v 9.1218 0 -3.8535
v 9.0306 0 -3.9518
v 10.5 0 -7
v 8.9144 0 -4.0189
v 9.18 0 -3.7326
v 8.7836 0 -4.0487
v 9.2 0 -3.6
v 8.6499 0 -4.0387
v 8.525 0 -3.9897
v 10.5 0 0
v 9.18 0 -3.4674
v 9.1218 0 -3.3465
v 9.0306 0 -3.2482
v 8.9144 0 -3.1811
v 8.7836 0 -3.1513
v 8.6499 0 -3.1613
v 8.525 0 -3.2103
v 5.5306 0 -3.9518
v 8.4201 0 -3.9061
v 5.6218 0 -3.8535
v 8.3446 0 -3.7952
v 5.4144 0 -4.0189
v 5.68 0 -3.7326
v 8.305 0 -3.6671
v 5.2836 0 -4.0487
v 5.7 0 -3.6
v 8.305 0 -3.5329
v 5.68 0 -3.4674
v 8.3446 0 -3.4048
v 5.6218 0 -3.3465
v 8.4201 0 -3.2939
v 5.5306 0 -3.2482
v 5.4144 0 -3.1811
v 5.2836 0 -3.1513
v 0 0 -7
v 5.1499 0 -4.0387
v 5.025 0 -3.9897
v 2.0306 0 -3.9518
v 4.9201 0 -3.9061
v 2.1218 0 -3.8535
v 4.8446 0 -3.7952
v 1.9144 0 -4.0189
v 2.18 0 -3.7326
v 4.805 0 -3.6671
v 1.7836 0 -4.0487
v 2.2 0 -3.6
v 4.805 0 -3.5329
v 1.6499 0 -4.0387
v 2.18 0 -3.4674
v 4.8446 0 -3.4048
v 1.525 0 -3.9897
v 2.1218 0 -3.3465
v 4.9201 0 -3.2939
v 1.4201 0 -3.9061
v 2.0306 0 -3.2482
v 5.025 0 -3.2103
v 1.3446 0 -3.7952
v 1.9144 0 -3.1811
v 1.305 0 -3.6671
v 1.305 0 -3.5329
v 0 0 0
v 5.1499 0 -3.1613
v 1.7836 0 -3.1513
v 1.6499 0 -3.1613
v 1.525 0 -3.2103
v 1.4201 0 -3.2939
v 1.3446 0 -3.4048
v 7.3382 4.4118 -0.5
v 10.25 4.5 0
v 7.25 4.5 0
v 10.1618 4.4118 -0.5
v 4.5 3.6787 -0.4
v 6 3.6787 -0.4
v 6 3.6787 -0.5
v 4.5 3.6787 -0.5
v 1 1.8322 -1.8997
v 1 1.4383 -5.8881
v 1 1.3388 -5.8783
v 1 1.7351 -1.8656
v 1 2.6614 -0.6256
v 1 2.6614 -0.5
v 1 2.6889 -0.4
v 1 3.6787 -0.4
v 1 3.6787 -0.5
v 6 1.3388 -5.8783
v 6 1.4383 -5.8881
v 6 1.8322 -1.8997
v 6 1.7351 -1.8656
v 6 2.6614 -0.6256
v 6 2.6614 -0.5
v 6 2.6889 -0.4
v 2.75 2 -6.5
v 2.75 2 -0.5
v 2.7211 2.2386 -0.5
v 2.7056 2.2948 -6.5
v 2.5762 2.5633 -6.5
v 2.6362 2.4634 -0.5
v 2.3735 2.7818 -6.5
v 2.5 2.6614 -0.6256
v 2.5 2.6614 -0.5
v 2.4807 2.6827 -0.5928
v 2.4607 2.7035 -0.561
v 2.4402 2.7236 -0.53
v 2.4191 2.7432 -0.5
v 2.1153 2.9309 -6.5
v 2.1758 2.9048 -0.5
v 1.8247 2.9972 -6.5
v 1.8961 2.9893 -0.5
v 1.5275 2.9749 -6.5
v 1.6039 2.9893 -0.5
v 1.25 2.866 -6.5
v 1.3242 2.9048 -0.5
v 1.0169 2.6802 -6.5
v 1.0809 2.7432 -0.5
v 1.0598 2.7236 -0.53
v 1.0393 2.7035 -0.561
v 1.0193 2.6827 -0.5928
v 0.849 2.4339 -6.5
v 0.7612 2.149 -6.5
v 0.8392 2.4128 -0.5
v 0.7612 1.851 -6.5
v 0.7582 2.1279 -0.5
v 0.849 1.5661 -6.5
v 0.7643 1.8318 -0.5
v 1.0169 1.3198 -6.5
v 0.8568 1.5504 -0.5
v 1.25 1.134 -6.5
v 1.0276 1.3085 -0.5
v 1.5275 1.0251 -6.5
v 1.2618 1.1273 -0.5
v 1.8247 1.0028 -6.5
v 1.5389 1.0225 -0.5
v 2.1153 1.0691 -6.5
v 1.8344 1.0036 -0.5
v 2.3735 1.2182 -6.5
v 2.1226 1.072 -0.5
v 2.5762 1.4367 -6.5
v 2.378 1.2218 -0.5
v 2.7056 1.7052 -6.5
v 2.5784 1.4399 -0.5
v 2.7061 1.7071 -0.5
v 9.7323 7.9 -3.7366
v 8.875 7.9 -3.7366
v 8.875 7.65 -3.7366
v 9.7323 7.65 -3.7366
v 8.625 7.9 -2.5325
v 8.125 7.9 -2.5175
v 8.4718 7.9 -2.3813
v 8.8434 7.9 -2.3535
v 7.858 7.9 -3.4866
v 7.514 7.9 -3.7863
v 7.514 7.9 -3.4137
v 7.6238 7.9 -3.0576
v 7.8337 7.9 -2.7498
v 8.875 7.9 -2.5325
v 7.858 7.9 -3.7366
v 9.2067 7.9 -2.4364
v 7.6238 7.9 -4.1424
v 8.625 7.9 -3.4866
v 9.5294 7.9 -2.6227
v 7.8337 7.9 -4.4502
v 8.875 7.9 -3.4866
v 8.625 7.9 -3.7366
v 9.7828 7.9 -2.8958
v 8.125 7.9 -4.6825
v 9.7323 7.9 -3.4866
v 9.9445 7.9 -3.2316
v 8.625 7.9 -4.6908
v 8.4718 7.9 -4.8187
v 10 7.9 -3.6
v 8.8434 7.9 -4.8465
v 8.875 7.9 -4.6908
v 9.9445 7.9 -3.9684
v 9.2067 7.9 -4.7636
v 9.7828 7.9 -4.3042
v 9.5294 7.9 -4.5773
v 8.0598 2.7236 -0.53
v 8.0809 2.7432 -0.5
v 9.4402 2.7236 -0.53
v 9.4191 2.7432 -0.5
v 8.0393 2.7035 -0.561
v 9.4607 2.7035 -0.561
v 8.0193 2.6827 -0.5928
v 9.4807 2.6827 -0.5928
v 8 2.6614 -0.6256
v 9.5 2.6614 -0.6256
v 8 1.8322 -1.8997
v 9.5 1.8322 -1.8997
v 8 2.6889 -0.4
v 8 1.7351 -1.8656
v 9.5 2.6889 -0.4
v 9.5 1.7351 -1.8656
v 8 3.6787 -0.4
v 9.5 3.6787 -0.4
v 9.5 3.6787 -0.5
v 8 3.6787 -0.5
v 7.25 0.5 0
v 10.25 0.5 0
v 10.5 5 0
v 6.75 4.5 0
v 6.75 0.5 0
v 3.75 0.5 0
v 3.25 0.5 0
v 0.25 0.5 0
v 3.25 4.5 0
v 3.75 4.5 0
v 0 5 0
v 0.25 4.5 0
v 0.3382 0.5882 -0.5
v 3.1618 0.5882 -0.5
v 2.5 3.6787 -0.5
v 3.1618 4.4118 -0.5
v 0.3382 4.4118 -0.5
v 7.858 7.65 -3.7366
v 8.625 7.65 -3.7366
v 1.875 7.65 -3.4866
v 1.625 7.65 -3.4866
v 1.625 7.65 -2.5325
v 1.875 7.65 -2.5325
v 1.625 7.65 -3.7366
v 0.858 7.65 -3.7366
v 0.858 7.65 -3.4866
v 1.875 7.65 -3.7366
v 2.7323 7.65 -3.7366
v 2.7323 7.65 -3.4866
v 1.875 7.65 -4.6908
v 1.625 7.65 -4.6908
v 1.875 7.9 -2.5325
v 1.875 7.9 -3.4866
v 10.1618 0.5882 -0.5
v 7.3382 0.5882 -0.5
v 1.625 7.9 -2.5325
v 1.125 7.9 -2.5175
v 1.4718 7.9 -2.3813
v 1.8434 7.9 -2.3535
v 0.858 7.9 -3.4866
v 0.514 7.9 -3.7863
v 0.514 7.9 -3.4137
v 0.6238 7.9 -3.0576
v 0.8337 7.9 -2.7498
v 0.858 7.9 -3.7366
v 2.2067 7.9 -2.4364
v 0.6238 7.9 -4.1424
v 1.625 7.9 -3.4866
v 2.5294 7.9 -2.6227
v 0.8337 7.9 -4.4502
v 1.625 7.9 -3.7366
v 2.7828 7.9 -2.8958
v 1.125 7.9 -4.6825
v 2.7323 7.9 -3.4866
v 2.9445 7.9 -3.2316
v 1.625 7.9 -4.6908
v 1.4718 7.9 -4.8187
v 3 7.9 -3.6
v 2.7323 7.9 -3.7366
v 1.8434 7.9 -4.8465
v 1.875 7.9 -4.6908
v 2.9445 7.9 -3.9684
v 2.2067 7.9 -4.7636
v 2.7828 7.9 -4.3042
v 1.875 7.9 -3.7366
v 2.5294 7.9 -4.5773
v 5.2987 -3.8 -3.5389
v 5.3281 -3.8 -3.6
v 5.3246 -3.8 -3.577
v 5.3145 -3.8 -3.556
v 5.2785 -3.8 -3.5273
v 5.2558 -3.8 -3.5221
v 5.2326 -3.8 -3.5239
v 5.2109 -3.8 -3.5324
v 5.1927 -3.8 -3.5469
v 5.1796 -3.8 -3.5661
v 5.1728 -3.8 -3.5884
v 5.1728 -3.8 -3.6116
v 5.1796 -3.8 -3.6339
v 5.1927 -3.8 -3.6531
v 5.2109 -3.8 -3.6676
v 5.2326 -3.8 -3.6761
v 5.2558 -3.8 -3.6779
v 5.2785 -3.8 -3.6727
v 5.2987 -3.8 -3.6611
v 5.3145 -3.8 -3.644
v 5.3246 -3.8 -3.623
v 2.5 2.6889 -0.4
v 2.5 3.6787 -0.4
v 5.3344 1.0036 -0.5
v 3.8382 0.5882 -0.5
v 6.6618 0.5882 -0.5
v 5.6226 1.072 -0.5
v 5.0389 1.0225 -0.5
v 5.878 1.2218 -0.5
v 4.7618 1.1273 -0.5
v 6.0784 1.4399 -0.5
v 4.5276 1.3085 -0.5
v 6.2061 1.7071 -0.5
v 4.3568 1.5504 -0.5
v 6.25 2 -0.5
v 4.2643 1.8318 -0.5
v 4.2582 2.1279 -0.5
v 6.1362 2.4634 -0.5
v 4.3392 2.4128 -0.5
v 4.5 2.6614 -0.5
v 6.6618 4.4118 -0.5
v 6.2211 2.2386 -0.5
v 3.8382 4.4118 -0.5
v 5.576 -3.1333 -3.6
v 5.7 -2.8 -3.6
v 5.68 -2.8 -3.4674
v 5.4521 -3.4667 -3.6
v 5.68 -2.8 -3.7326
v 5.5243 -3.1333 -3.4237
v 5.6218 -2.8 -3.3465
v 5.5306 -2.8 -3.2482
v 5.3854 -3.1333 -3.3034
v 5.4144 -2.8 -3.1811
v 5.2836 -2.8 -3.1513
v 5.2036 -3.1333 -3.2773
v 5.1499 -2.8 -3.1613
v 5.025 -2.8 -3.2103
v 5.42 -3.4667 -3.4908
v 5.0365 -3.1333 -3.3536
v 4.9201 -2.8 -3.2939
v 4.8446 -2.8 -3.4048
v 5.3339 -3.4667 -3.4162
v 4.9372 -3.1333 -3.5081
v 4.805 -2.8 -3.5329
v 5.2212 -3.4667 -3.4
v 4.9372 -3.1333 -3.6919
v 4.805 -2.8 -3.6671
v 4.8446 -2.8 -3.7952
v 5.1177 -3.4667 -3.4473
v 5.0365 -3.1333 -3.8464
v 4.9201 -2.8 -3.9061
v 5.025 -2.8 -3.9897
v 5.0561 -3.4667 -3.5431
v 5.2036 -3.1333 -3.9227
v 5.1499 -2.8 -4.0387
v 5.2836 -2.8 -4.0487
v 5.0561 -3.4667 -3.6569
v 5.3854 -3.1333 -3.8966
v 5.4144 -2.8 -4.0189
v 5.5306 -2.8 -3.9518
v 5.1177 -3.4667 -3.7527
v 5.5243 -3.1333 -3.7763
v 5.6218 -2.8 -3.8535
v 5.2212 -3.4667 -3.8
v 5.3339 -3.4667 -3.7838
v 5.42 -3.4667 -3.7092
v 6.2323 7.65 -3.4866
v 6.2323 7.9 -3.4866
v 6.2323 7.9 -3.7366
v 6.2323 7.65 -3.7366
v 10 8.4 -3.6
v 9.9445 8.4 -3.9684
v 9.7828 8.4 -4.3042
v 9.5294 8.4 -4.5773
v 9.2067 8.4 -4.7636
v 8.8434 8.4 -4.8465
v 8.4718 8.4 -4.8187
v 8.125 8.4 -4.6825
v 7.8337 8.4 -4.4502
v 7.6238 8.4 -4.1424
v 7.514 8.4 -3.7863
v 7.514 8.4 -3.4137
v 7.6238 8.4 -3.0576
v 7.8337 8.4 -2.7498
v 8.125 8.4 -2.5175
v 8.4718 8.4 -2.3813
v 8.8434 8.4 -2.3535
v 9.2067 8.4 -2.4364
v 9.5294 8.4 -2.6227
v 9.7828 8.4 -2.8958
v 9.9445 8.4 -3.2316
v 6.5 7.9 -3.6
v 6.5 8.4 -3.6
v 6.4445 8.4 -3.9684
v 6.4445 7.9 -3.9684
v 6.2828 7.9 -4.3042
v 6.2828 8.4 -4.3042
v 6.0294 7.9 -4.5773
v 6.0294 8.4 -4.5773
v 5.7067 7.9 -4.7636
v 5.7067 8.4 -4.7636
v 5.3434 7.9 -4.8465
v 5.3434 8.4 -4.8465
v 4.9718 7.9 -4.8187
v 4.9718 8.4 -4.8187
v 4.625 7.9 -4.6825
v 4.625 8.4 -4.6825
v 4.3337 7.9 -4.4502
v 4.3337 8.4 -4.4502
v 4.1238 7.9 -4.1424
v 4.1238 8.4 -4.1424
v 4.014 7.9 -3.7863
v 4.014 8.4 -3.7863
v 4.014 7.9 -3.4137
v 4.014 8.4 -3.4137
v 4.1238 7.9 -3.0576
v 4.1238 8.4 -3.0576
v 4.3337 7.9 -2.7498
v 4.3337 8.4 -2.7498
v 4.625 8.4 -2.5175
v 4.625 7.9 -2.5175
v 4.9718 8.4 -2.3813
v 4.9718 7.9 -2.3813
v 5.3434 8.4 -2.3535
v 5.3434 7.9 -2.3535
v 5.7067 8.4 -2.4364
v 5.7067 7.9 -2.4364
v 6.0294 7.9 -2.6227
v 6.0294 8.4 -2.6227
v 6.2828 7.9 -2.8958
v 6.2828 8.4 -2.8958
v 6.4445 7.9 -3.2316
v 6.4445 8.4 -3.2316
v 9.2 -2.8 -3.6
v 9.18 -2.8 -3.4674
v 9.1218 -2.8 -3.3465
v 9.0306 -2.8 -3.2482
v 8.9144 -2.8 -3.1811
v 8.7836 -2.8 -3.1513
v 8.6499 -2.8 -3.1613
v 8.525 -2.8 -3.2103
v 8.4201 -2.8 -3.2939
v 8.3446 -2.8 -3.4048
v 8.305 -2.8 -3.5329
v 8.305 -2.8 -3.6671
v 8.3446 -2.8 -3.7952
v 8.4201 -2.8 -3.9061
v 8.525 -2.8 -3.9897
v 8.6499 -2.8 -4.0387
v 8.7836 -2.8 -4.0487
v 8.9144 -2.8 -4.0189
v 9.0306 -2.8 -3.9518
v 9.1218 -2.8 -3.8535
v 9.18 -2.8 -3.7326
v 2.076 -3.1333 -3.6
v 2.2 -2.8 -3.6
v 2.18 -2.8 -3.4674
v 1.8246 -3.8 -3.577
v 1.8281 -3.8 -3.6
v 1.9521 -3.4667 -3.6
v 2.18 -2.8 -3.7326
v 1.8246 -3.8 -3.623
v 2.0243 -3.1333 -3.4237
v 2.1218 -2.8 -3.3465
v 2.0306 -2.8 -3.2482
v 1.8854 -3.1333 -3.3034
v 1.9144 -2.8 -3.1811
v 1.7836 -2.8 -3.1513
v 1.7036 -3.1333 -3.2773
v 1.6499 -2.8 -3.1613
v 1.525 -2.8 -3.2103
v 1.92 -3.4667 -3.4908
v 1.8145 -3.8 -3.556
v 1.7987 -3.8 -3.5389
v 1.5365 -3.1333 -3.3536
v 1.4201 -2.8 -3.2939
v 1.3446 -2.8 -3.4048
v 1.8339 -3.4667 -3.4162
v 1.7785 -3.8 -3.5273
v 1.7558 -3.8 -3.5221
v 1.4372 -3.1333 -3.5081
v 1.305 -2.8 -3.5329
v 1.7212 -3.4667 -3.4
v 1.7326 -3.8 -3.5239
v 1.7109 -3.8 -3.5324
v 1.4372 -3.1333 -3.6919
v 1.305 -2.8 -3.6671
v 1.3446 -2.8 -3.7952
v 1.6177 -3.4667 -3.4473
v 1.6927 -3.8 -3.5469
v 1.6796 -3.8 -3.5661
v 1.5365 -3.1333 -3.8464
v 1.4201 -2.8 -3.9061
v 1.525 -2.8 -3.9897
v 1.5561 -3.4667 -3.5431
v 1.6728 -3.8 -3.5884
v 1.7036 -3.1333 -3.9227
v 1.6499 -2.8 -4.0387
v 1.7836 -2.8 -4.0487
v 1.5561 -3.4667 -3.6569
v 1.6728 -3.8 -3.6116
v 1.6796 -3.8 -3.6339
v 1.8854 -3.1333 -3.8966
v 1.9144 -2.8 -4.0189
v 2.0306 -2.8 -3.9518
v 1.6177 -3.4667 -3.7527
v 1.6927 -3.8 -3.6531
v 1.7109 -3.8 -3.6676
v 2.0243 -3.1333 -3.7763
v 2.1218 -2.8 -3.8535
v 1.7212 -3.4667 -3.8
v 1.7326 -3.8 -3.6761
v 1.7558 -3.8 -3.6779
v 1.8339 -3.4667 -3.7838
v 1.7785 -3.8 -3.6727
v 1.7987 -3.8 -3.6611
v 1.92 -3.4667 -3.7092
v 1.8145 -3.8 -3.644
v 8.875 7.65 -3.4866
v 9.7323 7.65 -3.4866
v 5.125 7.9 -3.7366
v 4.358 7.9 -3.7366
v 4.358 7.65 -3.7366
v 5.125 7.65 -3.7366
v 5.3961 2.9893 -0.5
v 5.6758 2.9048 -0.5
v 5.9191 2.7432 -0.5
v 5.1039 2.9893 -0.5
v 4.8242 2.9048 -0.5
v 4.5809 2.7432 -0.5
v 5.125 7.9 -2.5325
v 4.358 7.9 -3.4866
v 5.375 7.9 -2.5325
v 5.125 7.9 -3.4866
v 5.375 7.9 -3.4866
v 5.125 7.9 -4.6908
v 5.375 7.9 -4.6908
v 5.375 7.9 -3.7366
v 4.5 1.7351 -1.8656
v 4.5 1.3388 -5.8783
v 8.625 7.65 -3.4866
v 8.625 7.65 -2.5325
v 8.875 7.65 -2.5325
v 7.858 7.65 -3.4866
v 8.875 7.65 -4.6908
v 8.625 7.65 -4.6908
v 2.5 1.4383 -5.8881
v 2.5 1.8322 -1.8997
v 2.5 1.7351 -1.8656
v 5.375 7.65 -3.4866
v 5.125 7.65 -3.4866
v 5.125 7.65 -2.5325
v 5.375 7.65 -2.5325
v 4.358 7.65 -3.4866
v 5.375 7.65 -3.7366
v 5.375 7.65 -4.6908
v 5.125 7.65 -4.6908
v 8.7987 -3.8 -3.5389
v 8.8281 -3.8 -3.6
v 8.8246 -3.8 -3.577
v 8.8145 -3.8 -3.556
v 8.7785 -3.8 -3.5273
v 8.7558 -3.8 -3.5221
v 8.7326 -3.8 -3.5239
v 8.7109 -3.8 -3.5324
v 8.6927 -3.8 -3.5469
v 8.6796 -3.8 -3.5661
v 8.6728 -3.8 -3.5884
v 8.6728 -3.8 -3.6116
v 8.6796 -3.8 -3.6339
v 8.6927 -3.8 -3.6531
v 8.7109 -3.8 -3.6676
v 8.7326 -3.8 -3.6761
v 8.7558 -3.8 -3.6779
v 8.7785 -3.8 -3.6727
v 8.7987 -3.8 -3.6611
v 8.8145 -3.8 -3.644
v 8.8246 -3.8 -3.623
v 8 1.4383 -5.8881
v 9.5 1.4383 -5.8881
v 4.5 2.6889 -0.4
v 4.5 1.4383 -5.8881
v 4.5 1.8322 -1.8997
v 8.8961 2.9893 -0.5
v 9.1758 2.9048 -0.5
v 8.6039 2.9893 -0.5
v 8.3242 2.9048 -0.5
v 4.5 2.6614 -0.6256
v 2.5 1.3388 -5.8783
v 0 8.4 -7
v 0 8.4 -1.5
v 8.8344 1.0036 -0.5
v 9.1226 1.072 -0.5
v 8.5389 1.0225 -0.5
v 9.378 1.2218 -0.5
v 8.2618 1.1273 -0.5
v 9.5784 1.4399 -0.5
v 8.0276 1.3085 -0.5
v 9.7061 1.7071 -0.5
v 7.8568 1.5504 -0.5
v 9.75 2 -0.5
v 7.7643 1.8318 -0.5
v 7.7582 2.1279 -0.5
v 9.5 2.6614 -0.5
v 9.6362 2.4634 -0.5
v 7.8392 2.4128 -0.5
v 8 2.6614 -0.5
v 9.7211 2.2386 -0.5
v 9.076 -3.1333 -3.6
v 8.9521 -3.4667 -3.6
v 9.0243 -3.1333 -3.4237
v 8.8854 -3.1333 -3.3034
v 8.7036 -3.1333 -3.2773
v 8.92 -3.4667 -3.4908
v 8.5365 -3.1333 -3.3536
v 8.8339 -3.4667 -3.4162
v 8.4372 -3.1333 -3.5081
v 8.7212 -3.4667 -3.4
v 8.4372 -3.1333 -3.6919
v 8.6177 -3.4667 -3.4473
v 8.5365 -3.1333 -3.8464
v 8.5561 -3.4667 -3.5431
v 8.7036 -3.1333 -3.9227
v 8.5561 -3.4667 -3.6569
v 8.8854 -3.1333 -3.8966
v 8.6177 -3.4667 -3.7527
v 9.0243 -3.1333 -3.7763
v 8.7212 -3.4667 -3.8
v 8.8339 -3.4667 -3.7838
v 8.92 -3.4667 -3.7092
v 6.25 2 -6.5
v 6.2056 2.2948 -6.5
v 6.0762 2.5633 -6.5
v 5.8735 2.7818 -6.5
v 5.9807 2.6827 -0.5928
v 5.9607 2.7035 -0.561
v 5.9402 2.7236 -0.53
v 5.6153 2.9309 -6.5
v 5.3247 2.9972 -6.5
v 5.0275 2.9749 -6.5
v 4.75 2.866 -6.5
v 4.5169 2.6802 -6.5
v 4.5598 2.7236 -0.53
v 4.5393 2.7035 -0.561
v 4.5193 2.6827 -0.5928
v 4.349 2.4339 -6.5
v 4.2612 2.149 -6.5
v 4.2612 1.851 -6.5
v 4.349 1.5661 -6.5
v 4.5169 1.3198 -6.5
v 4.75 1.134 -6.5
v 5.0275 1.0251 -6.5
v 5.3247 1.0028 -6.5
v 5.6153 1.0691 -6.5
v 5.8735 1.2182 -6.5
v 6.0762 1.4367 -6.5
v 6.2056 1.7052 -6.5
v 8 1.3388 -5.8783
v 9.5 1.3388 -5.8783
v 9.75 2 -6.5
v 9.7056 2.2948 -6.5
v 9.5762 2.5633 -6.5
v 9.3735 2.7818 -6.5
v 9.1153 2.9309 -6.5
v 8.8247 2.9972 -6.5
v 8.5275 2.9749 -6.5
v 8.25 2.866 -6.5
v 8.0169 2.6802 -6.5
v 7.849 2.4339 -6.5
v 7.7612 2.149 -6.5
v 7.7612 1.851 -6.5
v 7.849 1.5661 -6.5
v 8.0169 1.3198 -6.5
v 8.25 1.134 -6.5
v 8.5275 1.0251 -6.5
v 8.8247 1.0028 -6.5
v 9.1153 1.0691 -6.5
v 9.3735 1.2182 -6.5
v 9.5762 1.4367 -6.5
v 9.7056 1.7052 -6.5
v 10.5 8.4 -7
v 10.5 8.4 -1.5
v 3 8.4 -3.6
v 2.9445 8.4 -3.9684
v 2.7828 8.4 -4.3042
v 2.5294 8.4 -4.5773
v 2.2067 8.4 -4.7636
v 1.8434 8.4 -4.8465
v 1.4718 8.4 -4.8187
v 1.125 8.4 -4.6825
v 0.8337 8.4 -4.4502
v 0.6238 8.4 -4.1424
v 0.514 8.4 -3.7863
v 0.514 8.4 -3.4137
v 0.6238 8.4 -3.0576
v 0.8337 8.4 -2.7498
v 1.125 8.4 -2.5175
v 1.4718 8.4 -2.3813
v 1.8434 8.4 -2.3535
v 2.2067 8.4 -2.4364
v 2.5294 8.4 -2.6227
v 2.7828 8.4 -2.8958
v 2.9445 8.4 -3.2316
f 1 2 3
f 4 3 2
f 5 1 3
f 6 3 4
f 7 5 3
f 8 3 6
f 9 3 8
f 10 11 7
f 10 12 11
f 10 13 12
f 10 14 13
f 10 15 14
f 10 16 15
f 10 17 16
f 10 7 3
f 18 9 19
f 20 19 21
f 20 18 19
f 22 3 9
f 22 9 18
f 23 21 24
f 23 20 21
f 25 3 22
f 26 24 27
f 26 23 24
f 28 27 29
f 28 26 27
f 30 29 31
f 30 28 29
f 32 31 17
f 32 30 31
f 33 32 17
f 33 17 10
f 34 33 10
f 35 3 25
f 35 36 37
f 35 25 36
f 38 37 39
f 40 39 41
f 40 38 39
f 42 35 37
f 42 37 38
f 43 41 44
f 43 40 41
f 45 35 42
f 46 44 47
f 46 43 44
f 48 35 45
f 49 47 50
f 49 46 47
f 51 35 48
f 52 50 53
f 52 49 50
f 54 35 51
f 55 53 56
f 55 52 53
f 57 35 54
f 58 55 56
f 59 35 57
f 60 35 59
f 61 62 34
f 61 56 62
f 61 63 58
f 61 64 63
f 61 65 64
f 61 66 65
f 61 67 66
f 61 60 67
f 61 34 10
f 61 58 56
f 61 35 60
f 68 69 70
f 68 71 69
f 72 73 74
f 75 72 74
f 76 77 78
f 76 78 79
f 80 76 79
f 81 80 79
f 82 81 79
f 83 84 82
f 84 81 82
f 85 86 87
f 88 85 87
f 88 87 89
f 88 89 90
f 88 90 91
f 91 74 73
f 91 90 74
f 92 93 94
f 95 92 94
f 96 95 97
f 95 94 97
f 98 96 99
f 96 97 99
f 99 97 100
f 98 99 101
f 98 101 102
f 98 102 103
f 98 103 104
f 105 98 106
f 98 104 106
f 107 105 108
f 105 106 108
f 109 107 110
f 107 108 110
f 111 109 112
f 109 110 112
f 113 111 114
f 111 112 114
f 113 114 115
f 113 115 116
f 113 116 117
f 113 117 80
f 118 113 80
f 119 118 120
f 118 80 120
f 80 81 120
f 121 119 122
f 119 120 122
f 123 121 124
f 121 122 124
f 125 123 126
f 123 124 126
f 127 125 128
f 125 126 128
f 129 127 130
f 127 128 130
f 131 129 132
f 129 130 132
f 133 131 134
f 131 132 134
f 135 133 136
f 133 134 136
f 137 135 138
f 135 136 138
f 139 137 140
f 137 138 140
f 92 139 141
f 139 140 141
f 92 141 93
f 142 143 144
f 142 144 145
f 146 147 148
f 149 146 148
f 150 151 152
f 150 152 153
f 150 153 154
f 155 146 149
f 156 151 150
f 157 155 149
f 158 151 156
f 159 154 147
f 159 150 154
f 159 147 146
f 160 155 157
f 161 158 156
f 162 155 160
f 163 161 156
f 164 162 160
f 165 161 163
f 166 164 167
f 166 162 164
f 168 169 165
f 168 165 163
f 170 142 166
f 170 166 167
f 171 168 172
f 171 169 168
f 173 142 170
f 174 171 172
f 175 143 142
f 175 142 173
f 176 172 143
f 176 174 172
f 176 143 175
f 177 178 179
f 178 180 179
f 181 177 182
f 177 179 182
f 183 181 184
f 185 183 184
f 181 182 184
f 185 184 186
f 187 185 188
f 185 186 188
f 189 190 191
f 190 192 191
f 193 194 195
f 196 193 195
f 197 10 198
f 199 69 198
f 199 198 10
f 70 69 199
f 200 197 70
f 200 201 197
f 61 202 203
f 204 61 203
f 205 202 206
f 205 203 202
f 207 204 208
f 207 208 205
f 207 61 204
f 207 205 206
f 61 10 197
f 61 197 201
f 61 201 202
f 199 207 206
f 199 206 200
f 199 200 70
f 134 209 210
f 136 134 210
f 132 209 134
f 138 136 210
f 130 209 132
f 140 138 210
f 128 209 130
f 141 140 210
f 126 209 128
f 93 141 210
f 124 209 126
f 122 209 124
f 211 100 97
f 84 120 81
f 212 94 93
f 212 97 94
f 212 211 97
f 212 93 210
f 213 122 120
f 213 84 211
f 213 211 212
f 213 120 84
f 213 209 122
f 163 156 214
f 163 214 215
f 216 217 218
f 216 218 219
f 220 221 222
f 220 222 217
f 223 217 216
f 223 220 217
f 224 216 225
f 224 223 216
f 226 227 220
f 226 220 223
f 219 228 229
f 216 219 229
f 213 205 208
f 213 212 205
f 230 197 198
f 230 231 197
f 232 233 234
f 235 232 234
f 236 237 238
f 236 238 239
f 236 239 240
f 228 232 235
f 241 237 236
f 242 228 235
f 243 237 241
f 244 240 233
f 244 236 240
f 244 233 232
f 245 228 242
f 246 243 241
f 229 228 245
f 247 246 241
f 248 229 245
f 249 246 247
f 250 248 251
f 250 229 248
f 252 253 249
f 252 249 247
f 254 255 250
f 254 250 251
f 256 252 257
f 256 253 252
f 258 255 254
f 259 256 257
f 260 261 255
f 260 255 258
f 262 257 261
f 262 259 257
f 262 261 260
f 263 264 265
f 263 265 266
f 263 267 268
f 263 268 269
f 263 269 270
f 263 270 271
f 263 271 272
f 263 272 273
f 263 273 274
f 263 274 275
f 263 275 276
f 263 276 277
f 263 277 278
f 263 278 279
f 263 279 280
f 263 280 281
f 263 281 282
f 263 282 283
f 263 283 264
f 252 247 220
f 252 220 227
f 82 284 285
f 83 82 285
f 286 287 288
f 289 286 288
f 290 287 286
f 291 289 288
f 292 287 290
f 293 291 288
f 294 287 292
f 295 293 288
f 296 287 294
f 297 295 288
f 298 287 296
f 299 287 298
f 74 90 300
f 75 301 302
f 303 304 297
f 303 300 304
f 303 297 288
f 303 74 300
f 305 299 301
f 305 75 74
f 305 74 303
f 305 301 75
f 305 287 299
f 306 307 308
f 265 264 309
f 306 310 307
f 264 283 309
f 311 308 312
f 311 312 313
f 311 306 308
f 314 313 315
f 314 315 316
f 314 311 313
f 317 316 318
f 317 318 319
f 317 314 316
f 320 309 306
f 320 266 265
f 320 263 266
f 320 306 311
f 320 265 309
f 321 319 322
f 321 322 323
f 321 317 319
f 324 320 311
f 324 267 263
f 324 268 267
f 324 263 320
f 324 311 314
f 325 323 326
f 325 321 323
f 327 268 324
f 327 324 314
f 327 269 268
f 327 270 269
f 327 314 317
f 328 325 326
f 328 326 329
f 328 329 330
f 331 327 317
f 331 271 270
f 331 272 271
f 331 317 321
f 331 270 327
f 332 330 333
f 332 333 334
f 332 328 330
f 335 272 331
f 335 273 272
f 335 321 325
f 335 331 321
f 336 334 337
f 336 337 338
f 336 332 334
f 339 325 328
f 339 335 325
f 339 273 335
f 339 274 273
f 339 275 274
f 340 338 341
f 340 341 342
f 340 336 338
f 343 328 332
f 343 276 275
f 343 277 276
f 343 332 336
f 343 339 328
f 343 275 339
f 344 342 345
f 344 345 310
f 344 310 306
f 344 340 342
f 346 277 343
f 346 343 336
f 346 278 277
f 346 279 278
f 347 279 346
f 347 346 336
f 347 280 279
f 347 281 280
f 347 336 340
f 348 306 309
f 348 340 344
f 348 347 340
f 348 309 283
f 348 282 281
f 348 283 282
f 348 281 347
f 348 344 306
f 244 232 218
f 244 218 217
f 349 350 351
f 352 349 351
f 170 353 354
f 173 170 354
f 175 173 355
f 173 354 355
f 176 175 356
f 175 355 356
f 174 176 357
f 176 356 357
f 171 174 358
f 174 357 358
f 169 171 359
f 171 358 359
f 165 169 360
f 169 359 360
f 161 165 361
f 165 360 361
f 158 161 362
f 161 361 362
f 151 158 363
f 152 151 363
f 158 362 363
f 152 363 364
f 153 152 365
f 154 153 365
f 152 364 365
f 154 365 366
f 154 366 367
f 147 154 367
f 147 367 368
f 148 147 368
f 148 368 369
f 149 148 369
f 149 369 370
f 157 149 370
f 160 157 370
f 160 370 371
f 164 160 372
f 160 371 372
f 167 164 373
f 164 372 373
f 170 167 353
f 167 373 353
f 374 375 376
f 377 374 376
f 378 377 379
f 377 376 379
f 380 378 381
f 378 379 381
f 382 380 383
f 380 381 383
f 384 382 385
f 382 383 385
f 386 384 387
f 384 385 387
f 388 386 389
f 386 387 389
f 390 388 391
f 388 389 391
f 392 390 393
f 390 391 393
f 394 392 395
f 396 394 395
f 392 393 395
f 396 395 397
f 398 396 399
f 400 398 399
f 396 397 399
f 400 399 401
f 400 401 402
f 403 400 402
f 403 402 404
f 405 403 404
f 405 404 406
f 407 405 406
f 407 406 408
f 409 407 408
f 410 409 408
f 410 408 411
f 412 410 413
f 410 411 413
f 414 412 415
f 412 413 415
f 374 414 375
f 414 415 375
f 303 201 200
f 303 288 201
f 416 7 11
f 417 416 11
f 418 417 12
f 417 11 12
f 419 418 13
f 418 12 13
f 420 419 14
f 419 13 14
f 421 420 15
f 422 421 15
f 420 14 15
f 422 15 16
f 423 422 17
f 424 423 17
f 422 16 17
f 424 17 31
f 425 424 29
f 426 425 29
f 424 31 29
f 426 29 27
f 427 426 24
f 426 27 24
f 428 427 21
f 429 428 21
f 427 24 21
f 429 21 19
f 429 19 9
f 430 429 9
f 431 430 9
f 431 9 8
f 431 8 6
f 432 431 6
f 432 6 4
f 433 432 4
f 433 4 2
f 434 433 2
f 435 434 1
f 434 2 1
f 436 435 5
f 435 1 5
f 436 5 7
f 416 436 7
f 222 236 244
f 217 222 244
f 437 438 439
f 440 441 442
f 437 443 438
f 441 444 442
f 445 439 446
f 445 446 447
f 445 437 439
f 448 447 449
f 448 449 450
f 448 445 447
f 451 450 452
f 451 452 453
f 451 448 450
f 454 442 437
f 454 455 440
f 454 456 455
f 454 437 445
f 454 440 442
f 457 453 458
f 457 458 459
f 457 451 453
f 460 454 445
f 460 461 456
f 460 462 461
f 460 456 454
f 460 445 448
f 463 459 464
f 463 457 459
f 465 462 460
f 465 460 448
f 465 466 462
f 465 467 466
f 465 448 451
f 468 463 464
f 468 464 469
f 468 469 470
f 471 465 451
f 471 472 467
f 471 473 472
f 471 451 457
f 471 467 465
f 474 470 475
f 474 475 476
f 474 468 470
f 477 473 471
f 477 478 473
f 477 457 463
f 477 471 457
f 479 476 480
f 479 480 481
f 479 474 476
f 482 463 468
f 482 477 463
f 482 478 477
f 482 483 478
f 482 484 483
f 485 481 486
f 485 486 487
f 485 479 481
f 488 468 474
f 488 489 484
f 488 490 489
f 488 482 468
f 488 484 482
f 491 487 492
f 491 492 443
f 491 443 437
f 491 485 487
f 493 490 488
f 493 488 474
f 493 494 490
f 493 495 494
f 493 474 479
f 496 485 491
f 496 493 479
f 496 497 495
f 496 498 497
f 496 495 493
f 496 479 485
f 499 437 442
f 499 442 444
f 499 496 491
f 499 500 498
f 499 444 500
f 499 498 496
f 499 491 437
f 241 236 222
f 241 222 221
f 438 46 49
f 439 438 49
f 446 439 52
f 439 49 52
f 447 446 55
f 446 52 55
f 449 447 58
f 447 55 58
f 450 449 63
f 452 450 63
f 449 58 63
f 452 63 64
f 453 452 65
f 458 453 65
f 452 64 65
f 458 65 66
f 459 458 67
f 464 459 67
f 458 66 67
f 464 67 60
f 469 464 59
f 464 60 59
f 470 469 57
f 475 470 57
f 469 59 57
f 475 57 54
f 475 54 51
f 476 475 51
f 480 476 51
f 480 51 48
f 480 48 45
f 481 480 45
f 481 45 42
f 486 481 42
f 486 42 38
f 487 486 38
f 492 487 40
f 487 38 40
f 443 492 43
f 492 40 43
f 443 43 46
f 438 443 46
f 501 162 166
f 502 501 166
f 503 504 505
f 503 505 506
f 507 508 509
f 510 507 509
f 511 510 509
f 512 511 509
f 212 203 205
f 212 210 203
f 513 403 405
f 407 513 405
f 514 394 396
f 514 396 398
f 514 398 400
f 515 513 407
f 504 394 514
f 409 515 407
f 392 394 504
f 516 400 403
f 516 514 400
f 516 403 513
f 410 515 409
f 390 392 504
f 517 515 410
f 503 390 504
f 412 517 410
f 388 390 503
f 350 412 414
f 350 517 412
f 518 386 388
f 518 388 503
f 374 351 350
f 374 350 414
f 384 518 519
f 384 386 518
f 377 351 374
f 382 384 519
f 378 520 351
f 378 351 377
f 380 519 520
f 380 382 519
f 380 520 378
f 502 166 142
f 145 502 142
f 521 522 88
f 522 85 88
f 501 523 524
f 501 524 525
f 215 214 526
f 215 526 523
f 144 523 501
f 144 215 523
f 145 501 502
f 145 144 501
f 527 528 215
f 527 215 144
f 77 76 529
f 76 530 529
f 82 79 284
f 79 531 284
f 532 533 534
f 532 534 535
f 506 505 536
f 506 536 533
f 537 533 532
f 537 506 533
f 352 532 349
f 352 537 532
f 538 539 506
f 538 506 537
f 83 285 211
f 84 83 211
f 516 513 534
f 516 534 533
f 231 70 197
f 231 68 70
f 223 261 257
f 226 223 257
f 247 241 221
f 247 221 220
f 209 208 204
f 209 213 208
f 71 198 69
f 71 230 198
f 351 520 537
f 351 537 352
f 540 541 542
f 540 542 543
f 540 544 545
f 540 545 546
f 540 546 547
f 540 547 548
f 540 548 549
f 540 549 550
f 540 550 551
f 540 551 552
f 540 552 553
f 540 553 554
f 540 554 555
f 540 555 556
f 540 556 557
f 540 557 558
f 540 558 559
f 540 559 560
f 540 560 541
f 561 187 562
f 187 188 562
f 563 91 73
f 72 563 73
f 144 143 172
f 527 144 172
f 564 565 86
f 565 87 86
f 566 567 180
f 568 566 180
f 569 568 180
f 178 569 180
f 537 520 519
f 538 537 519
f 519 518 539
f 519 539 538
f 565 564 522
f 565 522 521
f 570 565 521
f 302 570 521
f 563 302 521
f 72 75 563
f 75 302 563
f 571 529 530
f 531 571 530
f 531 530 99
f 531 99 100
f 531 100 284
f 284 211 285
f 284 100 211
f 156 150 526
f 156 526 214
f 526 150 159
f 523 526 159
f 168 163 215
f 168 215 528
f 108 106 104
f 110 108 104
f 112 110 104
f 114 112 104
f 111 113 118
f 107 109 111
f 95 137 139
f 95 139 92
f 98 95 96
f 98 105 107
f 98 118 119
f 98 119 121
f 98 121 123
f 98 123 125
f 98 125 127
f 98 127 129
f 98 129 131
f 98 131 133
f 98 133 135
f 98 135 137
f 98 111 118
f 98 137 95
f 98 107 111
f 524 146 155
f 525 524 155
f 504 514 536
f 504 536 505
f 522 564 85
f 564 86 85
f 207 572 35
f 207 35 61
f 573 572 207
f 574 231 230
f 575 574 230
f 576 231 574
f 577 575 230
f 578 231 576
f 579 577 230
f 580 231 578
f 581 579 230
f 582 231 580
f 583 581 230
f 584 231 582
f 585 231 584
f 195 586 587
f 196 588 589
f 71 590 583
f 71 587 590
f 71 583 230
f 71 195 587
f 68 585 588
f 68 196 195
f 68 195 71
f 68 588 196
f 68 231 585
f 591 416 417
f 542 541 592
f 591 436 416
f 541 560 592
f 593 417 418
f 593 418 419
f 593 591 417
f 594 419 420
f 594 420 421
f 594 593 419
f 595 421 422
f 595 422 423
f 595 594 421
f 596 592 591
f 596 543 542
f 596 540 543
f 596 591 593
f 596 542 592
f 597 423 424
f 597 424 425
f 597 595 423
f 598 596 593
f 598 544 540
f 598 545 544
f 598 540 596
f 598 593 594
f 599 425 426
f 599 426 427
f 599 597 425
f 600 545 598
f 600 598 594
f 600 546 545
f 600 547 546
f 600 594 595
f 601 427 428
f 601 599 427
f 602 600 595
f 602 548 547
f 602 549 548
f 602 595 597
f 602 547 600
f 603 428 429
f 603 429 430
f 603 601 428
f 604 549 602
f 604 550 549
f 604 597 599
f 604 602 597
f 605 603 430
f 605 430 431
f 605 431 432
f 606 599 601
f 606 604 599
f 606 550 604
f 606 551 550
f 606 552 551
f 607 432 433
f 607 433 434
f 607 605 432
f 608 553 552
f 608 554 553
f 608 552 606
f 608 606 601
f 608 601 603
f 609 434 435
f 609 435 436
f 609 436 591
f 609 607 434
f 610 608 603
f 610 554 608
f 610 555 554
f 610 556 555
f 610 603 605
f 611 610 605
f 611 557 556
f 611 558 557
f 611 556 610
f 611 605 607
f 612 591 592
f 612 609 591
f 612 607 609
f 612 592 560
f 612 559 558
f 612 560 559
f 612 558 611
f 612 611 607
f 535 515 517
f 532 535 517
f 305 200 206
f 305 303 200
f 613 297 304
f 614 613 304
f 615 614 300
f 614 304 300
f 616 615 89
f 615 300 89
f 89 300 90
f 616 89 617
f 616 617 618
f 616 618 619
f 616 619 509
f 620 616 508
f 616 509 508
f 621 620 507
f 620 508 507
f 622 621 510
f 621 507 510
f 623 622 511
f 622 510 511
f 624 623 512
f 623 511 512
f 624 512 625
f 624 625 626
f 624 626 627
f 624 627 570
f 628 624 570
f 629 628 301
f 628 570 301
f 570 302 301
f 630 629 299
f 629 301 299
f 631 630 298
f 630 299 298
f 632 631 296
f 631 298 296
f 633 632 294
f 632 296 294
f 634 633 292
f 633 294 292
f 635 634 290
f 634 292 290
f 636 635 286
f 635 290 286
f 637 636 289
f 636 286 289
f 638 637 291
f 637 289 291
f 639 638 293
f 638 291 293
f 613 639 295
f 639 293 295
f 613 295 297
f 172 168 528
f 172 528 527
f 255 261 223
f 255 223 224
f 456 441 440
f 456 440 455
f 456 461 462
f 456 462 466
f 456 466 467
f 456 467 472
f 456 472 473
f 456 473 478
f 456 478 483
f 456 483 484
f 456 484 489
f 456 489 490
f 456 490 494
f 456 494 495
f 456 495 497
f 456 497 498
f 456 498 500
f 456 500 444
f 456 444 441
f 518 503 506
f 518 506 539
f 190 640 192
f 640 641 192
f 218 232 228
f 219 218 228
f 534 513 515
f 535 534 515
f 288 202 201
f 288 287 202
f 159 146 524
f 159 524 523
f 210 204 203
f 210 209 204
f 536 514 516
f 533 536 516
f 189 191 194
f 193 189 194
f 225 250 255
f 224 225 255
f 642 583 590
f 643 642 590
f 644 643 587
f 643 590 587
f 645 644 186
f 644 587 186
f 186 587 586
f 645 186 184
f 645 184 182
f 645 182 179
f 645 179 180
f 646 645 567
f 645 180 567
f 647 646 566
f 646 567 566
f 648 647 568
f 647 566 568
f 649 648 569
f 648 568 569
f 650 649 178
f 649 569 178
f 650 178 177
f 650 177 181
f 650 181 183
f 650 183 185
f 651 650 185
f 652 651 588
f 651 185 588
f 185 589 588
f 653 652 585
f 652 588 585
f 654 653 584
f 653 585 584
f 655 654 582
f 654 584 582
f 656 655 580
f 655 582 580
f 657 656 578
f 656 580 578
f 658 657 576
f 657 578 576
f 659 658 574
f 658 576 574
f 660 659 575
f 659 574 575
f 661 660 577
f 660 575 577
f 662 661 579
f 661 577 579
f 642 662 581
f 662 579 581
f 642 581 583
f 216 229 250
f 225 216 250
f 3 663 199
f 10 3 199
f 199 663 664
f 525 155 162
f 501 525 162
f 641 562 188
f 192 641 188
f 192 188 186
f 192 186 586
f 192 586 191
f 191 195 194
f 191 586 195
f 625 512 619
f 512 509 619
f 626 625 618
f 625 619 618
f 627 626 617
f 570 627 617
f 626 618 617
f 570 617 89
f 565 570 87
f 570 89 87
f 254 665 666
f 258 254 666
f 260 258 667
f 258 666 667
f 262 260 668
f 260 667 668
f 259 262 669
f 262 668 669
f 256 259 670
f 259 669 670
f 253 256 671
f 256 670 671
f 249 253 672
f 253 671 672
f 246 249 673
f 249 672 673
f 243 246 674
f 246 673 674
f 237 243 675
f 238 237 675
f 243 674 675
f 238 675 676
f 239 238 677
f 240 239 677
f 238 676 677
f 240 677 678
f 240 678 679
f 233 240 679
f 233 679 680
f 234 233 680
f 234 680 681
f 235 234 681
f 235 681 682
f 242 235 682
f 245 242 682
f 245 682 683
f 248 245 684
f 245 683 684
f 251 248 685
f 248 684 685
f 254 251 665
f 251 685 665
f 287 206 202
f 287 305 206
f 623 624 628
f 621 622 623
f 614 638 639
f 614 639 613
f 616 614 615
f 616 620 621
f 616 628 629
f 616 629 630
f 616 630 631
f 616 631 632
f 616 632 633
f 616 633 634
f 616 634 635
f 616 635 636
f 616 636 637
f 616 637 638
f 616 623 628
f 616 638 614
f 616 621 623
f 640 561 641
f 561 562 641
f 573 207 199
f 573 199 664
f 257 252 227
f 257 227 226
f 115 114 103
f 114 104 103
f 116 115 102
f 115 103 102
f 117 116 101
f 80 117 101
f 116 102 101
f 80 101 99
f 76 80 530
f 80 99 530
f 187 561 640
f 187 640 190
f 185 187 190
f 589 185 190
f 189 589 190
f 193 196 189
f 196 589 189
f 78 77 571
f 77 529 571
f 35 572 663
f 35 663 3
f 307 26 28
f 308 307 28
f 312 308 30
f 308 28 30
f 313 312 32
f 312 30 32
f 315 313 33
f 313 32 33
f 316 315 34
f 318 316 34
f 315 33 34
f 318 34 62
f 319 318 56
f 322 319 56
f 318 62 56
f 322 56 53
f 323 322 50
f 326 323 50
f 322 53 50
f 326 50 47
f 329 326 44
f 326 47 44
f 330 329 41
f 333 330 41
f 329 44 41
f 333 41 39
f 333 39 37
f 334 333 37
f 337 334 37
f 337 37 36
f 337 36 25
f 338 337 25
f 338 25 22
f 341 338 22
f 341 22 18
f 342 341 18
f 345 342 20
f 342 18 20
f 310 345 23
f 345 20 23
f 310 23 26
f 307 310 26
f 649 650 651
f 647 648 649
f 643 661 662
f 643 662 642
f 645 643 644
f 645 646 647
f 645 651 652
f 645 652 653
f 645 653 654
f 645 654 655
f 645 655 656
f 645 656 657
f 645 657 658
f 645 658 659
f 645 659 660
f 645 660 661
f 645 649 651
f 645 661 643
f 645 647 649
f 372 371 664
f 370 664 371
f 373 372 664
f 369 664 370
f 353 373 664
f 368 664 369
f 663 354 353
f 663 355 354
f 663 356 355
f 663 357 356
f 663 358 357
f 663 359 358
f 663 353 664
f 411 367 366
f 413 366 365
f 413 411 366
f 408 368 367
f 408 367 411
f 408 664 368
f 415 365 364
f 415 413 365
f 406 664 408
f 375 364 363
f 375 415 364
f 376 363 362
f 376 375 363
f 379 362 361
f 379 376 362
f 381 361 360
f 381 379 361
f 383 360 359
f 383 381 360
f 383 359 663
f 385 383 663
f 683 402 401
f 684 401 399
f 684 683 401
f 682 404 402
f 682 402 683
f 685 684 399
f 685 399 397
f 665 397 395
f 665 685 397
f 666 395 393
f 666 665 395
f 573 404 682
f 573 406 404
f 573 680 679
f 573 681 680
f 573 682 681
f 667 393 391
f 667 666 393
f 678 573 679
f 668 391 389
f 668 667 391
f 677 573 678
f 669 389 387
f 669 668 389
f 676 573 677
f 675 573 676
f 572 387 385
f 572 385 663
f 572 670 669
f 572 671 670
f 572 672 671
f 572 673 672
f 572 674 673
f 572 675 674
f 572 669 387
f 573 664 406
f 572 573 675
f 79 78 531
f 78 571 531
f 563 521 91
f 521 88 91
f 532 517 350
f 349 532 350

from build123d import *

# Parameters (mm, degrees)
BOSS_EXTRUDE1_DEPTH         = 10.5
SKETCH2_R                   = 1.25
CUT_EXTRUDE1_DEPTH          = 0.5
SKETCH3_W                   = 3
SKETCH3_H                   = 4
CUT_EXTRUDE2_DEPTH          = 0.5
CUT_EXTRUDE2_TAPER          = 10
SKETCH4_R                   = 1
CUT_EXTRUDE3_DEPTH          = 6
SKETCH6_R                   = 0.45
BOSS_EXTRUDE3_DEPTH         = 3.8
CHAMFER1_SIZE               = 1
CHAMFER1_SIZE2              = 0.371896666
EXTRUDE_THIN1_DEPTH         = 0.75
SKETCH8_W                   = 0.25
SKETCH8_H                   = 2.158330758
SKETCH8_W_2                 = 1.874325027
SKETCH8_H_2                 = 0.25
CUT_EXTRUDE_THIN1_DEPTH     = 0.25
LPATTERN1_COUNT             = 3
LPATTERN1_PITCH             = 3.5
CHAMFER1_OF_LPATTERN1_SIZE2 = 0.371896666
CHAMFER1_OF_LPATTERN1_SIZE  = 1


with BuildPart() as part:
    # Sketch1 → Boss-Extrude1 (new body)
    with BuildSketch(Plane(origin=(0, 0, 0), x_dir=(0, 0, -1), z_dir=(1, 0, 0))):
        Polygon((0, 5), (1.5, 8.4), (7, 8.4), (7, 0), (0, 0), align=None)
    extrude(amount=BOSS_EXTRUDE1_DEPTH)

    # Sketch2 → Cut-Extrude1 (cut)
    with BuildSketch(Plane(origin=(0, 8.4, 0), x_dir=(1, 0, 0), z_dir=(0, 1, 0))):
        with Locations((1.75, 3.6)):
            Circle(SKETCH2_R)
    cut_extrude1 = extrude(amount=-CUT_EXTRUDE1_DEPTH, mode=Mode.SUBTRACT)

    # Sketch3 → Cut-Extrude2 (cut)
    with BuildSketch(Plane.XY):
        with Locations((1.75, 2.5)):
            Rectangle(SKETCH3_W, SKETCH3_H)
    cut_extrude2 = extrude(amount=-CUT_EXTRUDE2_DEPTH, taper=CUT_EXTRUDE2_TAPER, mode=Mode.SUBTRACT)

    # Sketch4 → Cut-Extrude3 (cut)
    with BuildSketch(Plane.XY.offset(-0.5)):
        with Locations((1.75, 2)):
            Circle(SKETCH4_R)
    cut_extrude3 = extrude(amount=-CUT_EXTRUDE3_DEPTH, mode=Mode.SUBTRACT)

    # Sketch6 → Boss-Extrude3 (add)
    with BuildSketch(Plane.XZ):
        with Locations((1.75, -3.6)):
            Circle(SKETCH6_R)
    boss_extrude3 = extrude(amount=BOSS_EXTRUDE3_DEPTH)

    # Chamfer1
    chamfer1_edges = [part.edges().sort_by_distance(p)[0] for p in [
        (1.3, -3.8, -3.6),
    ]]
    chamfer1_side = [part.faces().sort_by_distance(p)[0] for p in [
        (1.3, -1.9, -3.6),
    ]]
    chamfer(chamfer1_edges, length=CHAMFER1_SIZE, length2=CHAMFER1_SIZE2, reference=chamfer1_side[0])

    # Sketch7 → Extrude-Thin1 (add, symmetric)
    with BuildSketch(Plane(origin=(1.75, 0, 0), x_dir=(0, 0, -1), z_dir=(1, 0, 0))):
        Polygon((0.5, 3.678716588), (0.5, 2.743158903), (1.89970396, 1.832221158), (5.88813409, 1.438302133), (5.878305368, 1.338786324), (1.865601336, 1.735102771), (0.4, 2.688927019), (0.4, 3.678716588), align=None)
    extrude_thin1 = extrude(amount=EXTRUDE_THIN1_DEPTH, both=True)

    # Sketch8 → Cut-Extrude-Thin1 (cut, symmetric)
    with BuildSketch(Plane(origin=(0, 7.9, 0), x_dir=(1, 0, 0), z_dir=(0, 1, 0))):
        with Locations((1.75, 3.611637798)):
            Rectangle(SKETCH8_W, SKETCH8_H)
        with Locations((1.795143175, 3.611637798)):
            Rectangle(SKETCH8_W_2, SKETCH8_H_2)
    cut_extrude_thin1 = extrude(amount=CUT_EXTRUDE_THIN1_DEPTH, both=True, mode=Mode.SUBTRACT)

    # LPattern1: Cut-Extrude1, Cut-Extrude2, Cut-Extrude3, Boss-Extrude3, Extrude-Thin1, Cut-Extrude-Thin1 ×3
    with Locations(*[(i * LPATTERN1_PITCH, 0, 0) for i in range(1, LPATTERN1_COUNT)]):
        add(cut_extrude1, mode=Mode.SUBTRACT)
        add(cut_extrude2, mode=Mode.SUBTRACT)
        add(cut_extrude3, mode=Mode.SUBTRACT)
        add(boss_extrude3)
        add(extrude_thin1)
        add(cut_extrude_thin1, mode=Mode.SUBTRACT)

    # Chamfer1 of LPattern1
    chamfer1_of_lpattern1_edges = [part.edges().sort_by_distance(p)[0] for p in [
        (4.8, -3.8, -3.6),
        (8.3, -3.8, -3.6),
    ]]
    chamfer(chamfer1_of_lpattern1_edges, length=CHAMFER1_OF_LPATTERN1_SIZE, length2=CHAMFER1_OF_LPATTERN1_SIZE2)


solid = part.part
